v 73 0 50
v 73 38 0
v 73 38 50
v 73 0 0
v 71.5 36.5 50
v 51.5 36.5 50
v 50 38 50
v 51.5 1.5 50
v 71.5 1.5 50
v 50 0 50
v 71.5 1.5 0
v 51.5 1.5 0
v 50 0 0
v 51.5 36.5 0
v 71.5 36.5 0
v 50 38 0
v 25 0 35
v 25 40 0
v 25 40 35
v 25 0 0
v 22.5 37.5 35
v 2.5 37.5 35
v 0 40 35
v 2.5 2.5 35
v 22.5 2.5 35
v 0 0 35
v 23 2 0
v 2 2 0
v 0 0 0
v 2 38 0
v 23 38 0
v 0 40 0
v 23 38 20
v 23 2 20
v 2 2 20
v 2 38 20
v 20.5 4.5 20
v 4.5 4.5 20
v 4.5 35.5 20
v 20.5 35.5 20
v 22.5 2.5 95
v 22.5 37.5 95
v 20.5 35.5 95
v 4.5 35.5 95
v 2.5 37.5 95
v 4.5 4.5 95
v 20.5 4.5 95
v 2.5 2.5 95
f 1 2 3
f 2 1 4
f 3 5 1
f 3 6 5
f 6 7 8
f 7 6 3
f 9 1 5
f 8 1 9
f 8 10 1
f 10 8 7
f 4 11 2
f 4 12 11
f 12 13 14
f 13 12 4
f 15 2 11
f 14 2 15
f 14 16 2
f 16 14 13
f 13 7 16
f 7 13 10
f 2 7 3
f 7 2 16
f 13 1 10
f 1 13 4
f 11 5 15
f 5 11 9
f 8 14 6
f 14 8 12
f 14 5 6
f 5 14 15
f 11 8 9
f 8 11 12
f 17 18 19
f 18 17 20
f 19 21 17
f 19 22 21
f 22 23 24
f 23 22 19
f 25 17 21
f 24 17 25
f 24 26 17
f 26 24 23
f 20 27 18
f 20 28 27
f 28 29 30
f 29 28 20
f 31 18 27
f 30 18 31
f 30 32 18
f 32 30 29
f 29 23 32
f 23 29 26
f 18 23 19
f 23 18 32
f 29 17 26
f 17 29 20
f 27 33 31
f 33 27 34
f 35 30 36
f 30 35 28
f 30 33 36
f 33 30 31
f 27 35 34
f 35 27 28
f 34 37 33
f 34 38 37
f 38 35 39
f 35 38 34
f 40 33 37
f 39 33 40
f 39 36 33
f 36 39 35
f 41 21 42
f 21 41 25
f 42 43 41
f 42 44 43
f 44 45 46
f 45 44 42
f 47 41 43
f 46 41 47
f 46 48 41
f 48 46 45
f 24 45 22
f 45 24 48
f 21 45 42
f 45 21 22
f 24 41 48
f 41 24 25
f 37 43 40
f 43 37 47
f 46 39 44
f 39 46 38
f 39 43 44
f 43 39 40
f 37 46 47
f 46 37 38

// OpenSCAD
translate([50,0,0]) boxTube(20,35,50,1.5);

boxTubeReduction(20,35,2,0.5,75,20,15,0);

module boxTube(innerX, innerY, height, wallThickness) {
    internalOverlap=0.05;
    difference() {
        cube([innerX+wallThickness*2, innerY+wallThickness*2, height]);
        translate([wallThickness, wallThickness, -internalOverlap]) {
            cube([innerX, innerY, height+internalOverlap*2]);
        }
    }
}


/*
 * Creates a larger box tube into which another can insert
 * and a smaller box tube which would insert into the same
 * size opening as the larger box tube.
 *
 * The reason this is factored out as a module is that it
 * isn't trivial to "glue" the inner and outer boxes 
 * together.  Because this is intended to be used for 3D
 * printing, there must be some tolerance allowed for the
 * inner and outer pieces to actually fit together.  This
 * means the inner dimensions of the insertion box tube
 * must be slightly expanded, but the outer dimensions of
 * the smaller box tube cannot be.  This leaves a gap that
 * must be filled with a strategicly translated 3rd box tube
 * that is big enough to overlap both the inner and outer
 * surfaces of that gap and "glue" it together into the same
 * object, but only where the smaller and larger tubes intersect.
 * 
 * This is sorta how it looks in a cross section.
 *
 *        |             |  <--- inner
 *        |             |
 *      |||             |||
 *      |||             |||
 *      |\               /|
 *      | \             / |  <--- outer
 *      |  \__"glue"___/  |
 *
 * overlap = thin margin added to inner and outer dimensions
 *    to make the object merge with exact sized items in
 *    the model to which the object is returned.
 */
module boxTubeReduction(matedWidth, matedLength, 
        wallThickness, toleranceGap, 
        coreTubeLength, slipInsertionDepth,
        coreToSlipOverlapDepth, overlap) {
    internalOverlap=0.05;
    coreTubeInnerWidth=matedWidth-wallThickness*2;
    coreTubeInnerLength=matedLength-wallThickness*2;
    union() {
        boxTube(matedWidth+toleranceGap*2, 
                matedLength+toleranceGap*2, 
                slipInsertionDepth+coreToSlipOverlapDepth,
                wallThickness);
        // Since expanding the slip tube leaves a gap between it
        // and the outer surface of the core tube, the gap needs
        // to be filled to connect the model.
        // Note: The thickness of this tube is 1 * toleranceGap, 
        // but to overlap both outer and inner tubes, it expanded
        // by internalOverlap * 2 and positioned -1 * internalOverlap
        translate([wallThickness-internalOverlap,
                wallThickness-internalOverlap,
                slipInsertionDepth]) {
            // inner size starts at the core tube outer size (width or length
            // + 2x wall thickness) and is shrunk by 1 x slipTolerance, which is
            // really 2 * 1/2 * slipTolerance (i.e. 1/2 on each side * 2 sides).
            boxTube(matedWidth-internalOverlap*2,
                    matedLength-internalOverlap*2,
                    coreToSlipOverlapDepth,
                    toleranceGap+internalOverlap*2);
        }

        /* Core Part of Tube
         * Note: The slip tube internal size is adjusted by "overlap,"
         * so the core tube position must be centered by positioning at
         * -1 overlap in both X and Y directions.
         * Note: Length of core tube accounts for the slip overlap on both ends
         * and it is positioned lower by the slip overlap on one end.
         */
        translate([wallThickness+toleranceGap-overlap,
                wallThickness+toleranceGap-overlap,
                slipInsertionDepth]) {
            boxTube(coreTubeInnerWidth,
                    coreTubeInnerLength, 
                coreTubeLength,
                wallThickness+overlap);
        }
    }
}
